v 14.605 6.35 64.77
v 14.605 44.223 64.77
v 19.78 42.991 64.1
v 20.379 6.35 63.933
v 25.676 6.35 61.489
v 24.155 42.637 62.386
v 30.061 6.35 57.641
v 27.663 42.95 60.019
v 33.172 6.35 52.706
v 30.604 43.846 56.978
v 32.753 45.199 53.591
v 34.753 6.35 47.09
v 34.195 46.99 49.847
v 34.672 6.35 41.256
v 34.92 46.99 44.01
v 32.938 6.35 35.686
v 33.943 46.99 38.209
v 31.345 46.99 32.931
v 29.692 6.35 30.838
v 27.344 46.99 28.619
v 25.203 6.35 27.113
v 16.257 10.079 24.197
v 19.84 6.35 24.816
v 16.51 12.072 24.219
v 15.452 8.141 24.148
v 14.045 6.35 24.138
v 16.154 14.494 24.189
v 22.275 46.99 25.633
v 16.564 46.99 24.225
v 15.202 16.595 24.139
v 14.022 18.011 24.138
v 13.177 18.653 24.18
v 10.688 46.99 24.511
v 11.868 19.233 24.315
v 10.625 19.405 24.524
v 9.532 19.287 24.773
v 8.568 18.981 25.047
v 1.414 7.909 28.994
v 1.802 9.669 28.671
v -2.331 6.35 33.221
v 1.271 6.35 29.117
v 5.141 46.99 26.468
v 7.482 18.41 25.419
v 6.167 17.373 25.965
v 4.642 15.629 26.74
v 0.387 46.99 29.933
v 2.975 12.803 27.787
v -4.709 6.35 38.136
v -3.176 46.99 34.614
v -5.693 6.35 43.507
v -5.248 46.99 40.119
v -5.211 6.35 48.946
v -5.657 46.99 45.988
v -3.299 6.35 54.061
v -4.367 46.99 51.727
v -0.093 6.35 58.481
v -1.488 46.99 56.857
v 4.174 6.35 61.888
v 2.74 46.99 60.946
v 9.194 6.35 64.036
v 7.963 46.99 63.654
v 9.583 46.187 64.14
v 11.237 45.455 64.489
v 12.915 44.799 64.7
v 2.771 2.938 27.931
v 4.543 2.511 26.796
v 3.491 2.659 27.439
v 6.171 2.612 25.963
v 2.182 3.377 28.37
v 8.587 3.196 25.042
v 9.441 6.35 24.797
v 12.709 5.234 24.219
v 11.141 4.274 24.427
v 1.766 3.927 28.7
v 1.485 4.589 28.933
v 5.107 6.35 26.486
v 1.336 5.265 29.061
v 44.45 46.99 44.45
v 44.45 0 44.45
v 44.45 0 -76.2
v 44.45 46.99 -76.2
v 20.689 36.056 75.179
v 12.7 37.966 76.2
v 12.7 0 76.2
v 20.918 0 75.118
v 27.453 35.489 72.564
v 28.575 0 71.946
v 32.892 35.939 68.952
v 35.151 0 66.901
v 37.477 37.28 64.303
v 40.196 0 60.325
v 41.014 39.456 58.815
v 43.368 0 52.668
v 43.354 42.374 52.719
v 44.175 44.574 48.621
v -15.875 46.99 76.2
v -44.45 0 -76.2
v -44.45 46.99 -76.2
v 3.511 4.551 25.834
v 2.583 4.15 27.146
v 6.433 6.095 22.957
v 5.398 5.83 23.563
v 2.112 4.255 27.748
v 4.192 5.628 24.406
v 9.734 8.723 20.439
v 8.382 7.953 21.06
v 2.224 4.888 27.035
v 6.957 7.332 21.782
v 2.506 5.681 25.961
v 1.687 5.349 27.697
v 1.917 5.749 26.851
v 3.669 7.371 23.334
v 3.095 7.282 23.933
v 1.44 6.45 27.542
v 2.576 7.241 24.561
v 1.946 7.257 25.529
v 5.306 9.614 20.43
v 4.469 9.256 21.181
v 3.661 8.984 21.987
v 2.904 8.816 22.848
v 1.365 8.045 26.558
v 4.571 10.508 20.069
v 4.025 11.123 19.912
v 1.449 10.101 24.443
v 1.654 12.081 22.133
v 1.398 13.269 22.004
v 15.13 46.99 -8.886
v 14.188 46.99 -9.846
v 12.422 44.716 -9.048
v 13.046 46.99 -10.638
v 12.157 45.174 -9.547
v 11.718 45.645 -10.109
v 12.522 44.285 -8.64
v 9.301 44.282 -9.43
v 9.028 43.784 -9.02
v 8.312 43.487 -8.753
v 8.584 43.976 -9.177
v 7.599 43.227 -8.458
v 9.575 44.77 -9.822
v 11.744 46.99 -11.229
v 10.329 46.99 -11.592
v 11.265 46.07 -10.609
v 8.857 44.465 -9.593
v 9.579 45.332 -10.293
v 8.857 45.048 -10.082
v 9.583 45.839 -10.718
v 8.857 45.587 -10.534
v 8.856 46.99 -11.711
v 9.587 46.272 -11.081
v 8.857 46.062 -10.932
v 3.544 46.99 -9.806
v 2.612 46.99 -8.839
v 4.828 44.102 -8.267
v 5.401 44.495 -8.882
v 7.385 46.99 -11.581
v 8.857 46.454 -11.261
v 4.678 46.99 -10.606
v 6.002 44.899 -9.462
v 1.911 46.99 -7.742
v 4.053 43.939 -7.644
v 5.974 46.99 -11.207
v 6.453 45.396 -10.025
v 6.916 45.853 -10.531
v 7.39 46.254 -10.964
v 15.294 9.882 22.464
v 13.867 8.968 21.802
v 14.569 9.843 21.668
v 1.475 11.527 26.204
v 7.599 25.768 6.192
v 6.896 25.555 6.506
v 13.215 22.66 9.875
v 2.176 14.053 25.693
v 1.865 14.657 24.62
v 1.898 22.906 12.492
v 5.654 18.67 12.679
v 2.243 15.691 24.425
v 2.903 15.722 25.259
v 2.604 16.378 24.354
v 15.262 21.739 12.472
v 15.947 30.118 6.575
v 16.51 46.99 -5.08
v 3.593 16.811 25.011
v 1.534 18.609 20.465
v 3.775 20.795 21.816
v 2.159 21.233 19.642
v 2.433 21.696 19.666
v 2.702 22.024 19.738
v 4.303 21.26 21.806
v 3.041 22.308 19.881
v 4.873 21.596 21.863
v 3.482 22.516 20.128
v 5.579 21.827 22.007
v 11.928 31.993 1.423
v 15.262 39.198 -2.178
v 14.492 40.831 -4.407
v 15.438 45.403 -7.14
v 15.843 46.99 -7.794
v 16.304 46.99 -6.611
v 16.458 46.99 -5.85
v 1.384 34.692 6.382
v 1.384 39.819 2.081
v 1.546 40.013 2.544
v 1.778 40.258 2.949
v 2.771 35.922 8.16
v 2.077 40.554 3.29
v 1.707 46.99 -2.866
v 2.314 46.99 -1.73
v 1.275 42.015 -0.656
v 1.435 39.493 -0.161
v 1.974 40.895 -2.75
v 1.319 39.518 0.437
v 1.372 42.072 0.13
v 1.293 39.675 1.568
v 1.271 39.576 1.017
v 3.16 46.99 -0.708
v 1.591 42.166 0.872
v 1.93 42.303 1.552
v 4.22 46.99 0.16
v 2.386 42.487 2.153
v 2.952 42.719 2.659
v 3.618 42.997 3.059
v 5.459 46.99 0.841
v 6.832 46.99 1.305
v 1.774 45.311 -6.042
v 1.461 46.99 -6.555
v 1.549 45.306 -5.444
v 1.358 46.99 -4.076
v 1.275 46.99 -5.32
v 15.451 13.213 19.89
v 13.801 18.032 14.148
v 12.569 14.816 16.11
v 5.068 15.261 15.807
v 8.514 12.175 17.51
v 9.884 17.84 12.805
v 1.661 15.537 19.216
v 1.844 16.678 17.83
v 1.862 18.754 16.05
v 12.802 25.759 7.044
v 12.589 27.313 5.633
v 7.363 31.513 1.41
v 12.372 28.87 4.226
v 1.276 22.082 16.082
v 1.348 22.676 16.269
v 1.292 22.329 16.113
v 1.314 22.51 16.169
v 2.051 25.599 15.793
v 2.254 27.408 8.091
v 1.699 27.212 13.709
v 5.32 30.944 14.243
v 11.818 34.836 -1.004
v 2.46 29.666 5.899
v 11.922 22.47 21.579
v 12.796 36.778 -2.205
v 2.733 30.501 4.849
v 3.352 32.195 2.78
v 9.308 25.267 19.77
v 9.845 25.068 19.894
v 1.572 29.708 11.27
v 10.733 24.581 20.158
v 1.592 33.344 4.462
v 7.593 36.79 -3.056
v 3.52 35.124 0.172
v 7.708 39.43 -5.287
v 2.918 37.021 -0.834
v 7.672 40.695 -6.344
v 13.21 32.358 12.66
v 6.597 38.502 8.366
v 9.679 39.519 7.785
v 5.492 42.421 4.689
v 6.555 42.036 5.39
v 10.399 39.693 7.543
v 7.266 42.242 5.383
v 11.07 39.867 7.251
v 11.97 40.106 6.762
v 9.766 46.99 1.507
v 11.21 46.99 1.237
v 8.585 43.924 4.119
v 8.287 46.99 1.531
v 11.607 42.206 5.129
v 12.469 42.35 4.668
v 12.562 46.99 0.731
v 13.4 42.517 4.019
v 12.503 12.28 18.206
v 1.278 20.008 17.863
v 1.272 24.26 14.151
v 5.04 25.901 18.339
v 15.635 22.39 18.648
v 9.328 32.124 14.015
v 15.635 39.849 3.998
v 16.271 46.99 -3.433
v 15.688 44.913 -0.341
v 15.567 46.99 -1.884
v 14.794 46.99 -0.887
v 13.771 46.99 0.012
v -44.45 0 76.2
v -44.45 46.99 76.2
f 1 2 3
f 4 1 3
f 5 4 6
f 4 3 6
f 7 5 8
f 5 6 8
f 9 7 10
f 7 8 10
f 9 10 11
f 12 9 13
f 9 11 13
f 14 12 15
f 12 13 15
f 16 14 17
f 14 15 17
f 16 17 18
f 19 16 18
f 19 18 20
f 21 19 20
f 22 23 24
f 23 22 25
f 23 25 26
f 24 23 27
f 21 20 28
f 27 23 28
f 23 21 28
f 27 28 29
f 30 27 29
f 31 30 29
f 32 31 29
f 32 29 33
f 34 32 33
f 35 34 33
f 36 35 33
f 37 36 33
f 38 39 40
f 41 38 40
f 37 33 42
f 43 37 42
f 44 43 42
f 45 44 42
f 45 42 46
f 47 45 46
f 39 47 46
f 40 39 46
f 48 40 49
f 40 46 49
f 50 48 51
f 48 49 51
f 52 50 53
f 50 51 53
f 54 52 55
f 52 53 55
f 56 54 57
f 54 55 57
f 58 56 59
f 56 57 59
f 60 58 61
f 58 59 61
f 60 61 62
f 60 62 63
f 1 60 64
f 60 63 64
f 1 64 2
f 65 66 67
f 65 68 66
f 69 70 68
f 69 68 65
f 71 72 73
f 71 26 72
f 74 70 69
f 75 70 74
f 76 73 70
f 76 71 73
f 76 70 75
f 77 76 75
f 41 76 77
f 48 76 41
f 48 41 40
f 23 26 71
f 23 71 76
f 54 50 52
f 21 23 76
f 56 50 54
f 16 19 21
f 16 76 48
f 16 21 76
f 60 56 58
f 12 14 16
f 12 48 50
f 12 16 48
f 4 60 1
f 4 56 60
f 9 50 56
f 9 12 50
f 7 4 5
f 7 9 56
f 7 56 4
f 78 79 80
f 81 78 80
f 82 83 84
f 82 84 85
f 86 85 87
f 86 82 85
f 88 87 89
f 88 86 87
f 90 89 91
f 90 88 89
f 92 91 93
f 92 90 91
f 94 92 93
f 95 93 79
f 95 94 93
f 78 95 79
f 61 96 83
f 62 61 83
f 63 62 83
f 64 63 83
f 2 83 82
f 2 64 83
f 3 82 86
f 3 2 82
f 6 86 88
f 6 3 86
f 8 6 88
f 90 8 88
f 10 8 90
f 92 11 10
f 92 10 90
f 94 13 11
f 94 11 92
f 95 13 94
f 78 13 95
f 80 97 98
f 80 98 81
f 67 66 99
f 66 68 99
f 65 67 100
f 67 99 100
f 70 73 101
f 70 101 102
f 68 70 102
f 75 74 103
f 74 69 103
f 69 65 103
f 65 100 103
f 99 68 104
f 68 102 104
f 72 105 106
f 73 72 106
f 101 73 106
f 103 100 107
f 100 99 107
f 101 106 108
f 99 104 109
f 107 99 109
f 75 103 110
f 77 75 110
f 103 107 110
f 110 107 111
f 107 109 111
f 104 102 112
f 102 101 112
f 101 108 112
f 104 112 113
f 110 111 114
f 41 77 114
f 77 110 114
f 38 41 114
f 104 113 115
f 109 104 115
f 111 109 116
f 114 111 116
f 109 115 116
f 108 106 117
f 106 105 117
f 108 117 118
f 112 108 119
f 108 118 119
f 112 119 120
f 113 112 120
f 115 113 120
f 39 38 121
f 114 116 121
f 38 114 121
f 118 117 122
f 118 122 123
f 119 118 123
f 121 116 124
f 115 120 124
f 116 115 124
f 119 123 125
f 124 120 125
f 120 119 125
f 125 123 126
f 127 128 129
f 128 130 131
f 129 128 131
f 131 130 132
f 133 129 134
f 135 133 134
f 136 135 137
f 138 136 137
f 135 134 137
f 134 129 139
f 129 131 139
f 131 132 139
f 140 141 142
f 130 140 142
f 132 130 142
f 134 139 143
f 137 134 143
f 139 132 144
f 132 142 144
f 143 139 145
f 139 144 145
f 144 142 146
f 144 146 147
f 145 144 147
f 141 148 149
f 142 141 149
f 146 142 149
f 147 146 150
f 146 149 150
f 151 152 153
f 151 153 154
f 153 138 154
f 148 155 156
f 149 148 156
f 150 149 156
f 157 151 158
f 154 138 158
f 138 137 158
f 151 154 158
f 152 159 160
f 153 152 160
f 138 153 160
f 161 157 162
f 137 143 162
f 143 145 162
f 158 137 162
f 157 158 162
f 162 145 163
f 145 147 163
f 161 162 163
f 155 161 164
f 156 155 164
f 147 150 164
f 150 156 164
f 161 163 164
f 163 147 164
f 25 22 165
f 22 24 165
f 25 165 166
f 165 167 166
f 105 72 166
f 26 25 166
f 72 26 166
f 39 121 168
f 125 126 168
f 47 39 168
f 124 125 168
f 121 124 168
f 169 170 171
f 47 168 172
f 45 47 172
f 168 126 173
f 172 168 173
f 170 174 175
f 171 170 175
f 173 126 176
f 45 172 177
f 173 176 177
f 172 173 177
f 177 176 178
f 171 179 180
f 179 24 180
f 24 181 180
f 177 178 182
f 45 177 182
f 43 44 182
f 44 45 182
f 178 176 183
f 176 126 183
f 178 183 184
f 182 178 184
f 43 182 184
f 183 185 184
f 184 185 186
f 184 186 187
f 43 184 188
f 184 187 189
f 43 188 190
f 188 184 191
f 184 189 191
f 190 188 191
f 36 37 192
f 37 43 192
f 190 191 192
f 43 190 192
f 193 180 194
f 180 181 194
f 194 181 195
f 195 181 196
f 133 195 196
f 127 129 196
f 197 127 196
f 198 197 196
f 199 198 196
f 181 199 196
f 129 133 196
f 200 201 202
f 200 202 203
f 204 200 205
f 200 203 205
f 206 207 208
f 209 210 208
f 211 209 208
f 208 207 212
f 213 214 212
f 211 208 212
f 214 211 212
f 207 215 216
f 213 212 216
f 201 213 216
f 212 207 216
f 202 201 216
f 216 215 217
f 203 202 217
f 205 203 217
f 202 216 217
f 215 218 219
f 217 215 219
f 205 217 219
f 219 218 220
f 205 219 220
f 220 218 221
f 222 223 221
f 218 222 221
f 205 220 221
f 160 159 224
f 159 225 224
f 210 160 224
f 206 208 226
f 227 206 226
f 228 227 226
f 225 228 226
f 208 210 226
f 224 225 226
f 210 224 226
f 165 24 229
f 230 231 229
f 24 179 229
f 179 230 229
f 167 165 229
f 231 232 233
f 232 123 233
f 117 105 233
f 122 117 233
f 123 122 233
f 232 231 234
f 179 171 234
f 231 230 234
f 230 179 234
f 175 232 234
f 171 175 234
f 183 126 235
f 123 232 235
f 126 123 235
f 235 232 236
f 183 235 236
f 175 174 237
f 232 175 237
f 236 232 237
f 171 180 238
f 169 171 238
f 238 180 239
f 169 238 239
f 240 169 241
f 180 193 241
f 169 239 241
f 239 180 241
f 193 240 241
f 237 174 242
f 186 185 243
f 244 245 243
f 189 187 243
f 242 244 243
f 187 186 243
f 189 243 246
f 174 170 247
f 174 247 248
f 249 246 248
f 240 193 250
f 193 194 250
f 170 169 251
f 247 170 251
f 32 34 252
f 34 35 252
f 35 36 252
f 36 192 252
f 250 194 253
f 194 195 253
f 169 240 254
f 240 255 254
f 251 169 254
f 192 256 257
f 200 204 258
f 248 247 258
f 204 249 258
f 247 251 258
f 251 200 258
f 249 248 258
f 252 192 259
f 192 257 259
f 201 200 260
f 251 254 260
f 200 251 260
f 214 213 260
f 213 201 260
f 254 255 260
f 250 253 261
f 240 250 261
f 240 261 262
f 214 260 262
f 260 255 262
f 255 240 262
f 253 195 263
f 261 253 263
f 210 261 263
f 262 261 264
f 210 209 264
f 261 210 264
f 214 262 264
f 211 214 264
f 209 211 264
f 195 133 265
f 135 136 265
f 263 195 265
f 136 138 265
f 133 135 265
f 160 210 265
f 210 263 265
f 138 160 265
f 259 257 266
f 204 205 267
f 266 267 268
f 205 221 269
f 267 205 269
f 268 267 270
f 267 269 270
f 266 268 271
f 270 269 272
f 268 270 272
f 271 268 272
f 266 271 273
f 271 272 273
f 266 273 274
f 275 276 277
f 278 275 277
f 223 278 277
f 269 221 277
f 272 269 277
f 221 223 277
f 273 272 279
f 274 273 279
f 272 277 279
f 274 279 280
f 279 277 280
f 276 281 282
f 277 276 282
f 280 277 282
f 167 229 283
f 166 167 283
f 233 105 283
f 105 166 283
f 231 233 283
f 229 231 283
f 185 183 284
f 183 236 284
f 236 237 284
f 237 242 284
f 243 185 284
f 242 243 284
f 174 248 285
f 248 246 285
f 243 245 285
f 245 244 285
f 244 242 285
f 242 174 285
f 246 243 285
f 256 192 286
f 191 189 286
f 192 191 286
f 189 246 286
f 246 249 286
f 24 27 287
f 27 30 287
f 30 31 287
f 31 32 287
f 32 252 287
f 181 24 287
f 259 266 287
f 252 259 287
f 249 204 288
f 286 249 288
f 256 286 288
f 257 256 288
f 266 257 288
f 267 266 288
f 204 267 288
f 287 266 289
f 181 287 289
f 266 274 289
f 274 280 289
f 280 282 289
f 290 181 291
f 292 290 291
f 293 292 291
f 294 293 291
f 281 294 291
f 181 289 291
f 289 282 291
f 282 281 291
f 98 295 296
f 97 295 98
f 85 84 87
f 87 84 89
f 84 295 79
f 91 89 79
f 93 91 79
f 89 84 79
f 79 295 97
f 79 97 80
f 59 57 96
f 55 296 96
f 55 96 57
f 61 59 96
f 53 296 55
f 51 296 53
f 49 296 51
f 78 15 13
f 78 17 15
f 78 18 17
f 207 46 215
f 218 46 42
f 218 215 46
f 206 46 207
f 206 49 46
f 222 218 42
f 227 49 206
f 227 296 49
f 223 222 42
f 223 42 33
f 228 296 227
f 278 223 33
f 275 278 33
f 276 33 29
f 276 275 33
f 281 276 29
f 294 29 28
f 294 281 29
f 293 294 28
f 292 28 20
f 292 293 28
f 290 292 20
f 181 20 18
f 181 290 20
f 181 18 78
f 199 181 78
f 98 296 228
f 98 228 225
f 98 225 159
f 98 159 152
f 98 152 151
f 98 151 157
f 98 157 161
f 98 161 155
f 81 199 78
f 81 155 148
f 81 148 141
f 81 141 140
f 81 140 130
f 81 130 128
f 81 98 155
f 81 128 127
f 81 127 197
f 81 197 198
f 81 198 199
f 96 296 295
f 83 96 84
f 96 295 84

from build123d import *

# Parameters (mm, degrees)
SKETCH1_W               = 88.9
SKETCH1_H               = 152.4
BOSS_EXTRUDE1_DEPTH     = 46.99
FILLET1_R               = 31.75
CUT_EXTRUDE1_DEPTH      = 143.235650654
SKETCH6_R               = 20.32
CUT_EXTRUDE2_DEPTH      = 40.64
CUT_EXTRUDE3_REACH      = 154.734
CUT_EXTRUDE3_END_RADIUS = 20.32
SKETCH14_RX             = 7.62
SKETCH14_RY             = 5.08


with BuildPart() as part:
    # Sketch1 → Boss-Extrude1 (new body)
    with BuildSketch(Plane(origin=(0, 0, 0), x_dir=(1, 0, 0), z_dir=(0, 1, 0))):
        Rectangle(SKETCH1_W, SKETCH1_H)
    extrude(amount=BOSS_EXTRUDE1_DEPTH)

    # Fillet1
    fillet1_edges = [part.edges().sort_by_distance(p)[0] for p in [
        (44.45, 23.495, 76.2),
    ]]
    fillet(fillet1_edges, radius=FILLET1_R)

    # Sketch11 → Cut-Extrude1 (cut, through all)
    with BuildSketch(Plane(origin=(18.971914377, 60.07772886, 36.046637316), x_dir=(0.9652375973044347, -0.2241263770830731, -0.13447582624984392), z_dir=(0.2613740246274715, 0.8276844113203264, 0.49661064679219535))):
        Polygon((-36.101903277, -41.164805392), (26.395662264, -50.965949533), (26.395662264, -13.939405), align=None)
    extrude(amount=CUT_EXTRUDE1_DEPTH, mode=Mode.SUBTRACT)

    # Sketch6 → Cut-Extrude2 (cut)
    with BuildSketch(Plane(origin=(0, 46.99, 0), x_dir=(1, 0, 0), z_dir=(0, 1, 0))):
        with Locations(Location((14.605, -44.45, 0), (0, 0, 270))):
            Circle(SKETCH6_R)
    extrude(amount=-CUT_EXTRUDE2_DEPTH, mode=Mode.SUBTRACT)

    # Cut-Extrude3: up to this cylinder (the profile starts outside it)
    cut_extrude3_end = Plane(origin=(14.605, 82.009764, 44.45), z_dir=(0, 1, 0)) * Cylinder(CUT_EXTRUDE3_END_RADIUS, 351.108, mode=Mode.PRIVATE)
    # Sketch14 → Cut-Extrude3 (cut, up to the surface)
    with BuildSketch(Plane(origin=(0, 65.096039324, -54.622062588), x_dir=(-1, 0, 0), z_dir=(0, 0.7660444431189772, -0.6427876096865403)), mode=Mode.PRIVATE) as cut_extrude3_sk1:
        with Locations(Location((-8.89, 26.313084008), (0, 0, 180))):
            Ellipse(SKETCH14_RX, SKETCH14_RY)
    cut_extrude3_tool1 = extrude(cut_extrude3_sk1.sketch, amount=-CUT_EXTRUDE3_REACH, mode=Mode.PRIVATE) - cut_extrude3_end
    add(cut_extrude3_tool1.solids().sort_by_distance((8.89, 82.009764, -34.465071))[0], mode=Mode.SUBTRACT)


solid = part.part
